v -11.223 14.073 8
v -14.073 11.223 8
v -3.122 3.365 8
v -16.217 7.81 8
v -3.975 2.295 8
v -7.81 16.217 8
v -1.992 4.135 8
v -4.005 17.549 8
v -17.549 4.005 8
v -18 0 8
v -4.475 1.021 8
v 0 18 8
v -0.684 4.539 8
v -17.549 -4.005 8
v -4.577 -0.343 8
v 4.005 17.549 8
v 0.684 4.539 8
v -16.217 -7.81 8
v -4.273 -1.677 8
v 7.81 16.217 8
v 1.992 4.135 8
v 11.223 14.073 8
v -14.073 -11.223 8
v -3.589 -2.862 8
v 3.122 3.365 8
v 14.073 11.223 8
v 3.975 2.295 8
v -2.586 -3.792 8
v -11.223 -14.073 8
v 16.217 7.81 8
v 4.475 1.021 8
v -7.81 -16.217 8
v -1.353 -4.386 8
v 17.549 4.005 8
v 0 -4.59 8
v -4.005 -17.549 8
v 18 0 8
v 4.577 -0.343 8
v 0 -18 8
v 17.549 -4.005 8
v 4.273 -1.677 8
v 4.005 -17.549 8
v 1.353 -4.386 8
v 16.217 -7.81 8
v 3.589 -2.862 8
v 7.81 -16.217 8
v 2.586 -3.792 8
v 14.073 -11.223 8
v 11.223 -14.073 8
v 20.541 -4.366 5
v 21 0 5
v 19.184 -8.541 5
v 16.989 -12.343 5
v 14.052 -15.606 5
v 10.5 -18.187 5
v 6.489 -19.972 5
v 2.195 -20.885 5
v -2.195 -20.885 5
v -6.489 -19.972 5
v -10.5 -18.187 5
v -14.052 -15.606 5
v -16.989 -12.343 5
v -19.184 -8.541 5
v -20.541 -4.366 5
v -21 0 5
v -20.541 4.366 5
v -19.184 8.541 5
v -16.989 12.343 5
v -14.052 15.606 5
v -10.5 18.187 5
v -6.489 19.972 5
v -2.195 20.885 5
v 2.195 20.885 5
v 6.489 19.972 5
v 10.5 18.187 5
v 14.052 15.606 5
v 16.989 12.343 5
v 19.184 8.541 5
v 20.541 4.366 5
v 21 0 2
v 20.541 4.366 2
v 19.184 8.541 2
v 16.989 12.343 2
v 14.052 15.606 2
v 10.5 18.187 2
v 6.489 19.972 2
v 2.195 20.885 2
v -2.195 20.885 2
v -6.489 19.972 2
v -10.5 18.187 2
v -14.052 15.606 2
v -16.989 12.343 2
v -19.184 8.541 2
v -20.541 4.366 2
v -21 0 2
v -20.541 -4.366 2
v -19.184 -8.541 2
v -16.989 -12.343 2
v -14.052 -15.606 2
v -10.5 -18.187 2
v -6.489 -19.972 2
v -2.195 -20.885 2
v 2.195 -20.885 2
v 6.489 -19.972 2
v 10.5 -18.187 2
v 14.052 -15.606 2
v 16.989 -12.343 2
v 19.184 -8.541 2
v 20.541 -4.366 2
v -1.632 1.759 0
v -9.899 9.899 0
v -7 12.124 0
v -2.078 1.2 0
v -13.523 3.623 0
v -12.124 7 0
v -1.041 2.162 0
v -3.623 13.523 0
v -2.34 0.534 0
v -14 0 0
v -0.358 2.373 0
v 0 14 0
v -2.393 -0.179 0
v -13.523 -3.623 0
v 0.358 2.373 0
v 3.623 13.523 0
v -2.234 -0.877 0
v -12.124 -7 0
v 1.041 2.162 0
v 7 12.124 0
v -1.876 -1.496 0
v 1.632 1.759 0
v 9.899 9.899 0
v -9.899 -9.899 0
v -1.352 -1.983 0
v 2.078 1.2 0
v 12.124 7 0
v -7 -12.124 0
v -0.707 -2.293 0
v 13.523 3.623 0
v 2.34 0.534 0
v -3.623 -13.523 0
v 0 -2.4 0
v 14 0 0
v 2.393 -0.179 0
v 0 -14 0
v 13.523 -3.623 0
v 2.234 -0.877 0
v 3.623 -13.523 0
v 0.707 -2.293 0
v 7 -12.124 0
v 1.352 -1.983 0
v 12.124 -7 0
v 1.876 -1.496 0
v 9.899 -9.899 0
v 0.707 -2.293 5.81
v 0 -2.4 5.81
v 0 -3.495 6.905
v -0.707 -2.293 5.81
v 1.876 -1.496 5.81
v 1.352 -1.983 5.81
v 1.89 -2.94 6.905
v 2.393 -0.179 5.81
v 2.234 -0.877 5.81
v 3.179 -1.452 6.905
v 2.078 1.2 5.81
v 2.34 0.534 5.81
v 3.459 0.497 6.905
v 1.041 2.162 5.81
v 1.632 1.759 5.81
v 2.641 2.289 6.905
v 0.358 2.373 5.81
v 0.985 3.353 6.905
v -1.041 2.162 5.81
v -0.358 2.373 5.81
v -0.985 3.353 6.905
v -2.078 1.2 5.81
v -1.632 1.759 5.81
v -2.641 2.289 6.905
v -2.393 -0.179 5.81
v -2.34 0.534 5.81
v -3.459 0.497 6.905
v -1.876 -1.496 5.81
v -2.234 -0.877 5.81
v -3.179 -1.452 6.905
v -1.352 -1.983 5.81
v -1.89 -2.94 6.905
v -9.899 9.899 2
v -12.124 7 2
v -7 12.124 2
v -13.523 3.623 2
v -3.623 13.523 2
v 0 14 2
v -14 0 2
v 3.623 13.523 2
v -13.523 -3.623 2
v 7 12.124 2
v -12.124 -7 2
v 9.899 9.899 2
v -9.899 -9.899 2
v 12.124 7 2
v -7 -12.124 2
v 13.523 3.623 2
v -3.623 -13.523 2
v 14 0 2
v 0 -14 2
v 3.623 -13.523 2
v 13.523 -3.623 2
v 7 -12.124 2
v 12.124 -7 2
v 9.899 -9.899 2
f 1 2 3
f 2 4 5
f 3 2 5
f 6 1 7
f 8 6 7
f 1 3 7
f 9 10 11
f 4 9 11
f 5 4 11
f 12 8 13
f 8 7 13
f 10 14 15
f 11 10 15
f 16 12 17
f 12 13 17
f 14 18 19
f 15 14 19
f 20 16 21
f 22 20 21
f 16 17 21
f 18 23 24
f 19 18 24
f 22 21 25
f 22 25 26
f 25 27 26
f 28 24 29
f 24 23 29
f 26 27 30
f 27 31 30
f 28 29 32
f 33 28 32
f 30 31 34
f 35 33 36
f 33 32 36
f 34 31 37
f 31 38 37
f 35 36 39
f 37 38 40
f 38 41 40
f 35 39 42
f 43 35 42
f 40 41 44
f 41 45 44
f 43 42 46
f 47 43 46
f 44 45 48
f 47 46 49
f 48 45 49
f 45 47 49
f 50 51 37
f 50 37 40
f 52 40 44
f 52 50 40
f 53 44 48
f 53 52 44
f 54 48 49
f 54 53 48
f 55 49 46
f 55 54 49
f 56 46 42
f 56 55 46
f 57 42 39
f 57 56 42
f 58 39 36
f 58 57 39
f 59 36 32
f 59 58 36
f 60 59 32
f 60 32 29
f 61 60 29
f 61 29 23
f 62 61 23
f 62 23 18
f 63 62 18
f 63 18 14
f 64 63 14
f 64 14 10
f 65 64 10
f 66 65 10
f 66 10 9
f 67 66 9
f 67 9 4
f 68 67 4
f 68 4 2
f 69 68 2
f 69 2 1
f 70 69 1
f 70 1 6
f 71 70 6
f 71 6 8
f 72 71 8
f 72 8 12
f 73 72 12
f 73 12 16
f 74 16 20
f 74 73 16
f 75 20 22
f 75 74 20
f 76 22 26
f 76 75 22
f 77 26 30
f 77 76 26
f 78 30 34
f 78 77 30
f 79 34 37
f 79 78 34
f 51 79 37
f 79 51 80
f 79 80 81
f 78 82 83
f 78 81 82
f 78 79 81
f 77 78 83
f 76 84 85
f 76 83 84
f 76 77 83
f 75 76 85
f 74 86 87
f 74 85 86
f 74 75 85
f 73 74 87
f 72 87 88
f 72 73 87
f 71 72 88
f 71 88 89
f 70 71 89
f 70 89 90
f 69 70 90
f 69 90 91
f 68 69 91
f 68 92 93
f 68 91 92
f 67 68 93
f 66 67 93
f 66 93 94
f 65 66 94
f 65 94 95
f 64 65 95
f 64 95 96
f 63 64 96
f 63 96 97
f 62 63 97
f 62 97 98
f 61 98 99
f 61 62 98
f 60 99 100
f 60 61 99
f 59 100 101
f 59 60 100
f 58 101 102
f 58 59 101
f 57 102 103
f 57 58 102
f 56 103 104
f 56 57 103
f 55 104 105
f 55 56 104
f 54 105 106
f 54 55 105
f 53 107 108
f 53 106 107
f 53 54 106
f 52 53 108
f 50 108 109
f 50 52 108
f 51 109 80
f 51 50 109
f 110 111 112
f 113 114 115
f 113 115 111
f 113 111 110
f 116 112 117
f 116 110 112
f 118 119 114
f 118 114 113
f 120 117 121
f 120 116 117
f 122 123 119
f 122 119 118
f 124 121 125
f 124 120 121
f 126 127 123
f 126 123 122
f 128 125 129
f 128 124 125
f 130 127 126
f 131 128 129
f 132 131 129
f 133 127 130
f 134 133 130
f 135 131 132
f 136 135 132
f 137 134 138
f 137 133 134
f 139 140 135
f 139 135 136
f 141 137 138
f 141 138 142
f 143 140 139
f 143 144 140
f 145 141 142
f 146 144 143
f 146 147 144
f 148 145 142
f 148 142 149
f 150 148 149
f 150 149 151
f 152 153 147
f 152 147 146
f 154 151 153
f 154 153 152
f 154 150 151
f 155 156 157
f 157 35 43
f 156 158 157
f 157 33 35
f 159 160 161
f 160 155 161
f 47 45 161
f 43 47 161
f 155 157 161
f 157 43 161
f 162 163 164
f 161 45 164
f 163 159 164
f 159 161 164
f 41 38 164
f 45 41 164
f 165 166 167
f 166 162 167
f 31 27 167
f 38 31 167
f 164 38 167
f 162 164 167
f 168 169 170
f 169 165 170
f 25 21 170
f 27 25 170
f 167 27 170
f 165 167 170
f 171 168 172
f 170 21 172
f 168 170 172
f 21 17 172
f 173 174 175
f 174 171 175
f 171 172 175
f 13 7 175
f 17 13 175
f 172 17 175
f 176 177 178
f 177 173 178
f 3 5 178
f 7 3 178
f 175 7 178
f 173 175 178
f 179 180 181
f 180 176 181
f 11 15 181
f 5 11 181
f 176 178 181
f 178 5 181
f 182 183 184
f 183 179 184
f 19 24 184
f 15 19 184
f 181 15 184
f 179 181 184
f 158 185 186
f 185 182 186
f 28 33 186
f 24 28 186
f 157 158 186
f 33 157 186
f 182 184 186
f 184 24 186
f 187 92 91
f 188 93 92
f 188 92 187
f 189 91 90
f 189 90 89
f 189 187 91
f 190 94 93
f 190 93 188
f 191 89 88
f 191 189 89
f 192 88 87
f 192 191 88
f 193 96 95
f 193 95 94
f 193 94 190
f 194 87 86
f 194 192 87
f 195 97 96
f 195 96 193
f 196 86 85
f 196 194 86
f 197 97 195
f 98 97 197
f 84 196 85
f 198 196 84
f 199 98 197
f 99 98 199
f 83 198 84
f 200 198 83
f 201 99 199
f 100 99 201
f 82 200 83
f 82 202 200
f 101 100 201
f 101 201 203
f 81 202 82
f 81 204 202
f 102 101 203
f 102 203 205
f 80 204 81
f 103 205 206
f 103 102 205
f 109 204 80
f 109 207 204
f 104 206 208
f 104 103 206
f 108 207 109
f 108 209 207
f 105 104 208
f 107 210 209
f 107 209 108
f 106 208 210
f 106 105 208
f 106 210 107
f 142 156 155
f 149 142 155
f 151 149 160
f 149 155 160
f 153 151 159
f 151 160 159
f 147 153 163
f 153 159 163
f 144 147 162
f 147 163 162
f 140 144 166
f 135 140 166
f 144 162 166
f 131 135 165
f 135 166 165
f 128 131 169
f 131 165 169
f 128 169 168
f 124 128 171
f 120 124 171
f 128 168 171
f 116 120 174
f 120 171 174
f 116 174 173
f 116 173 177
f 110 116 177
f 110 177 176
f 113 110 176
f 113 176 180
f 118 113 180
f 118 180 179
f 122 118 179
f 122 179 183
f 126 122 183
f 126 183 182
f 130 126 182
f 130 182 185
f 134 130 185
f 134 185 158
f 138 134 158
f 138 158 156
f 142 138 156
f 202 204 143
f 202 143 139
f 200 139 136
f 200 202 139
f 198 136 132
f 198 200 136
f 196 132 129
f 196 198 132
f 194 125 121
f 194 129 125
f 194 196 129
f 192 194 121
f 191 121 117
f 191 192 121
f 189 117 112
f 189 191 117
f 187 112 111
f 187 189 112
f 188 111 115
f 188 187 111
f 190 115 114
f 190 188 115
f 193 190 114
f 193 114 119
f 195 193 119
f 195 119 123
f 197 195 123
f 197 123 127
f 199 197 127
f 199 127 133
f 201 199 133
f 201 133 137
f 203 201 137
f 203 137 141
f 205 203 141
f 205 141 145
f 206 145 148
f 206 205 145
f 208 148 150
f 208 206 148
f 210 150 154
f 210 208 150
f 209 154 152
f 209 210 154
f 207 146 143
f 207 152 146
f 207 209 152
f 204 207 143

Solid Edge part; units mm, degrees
sketch "Sketch1" plane through (0, 0, 0) normal (0, -1, 0) x (1, 0, 0)
  line L0 (0, 0) -> (14, 0)
  line L1 (14, 0) -> (14, 2)
  line L2 (14, 2) -> (21, 2)
  line L3 (21, 2) -> (21, 8)
  line L4 (21, 8) -> (0, 8)
  dimension "D1" = 8
  dimension "D2" = 6
revolve "RevolvedProtrusion1" add sketch "Sketch1" angle 360 about axis through (0, 0, 10) along (0, 0, -1)
chamfer "Chamfer1" distance 3 angle 45 1 edges at (-21, 0, 8)
hole "Hole_1" at (0, 0, 8) direction (0, 0, -1) diameter 4.8 end up to next countersink diameter 9.18 countersink angle 90
properties material "Polyethylene, low density"
